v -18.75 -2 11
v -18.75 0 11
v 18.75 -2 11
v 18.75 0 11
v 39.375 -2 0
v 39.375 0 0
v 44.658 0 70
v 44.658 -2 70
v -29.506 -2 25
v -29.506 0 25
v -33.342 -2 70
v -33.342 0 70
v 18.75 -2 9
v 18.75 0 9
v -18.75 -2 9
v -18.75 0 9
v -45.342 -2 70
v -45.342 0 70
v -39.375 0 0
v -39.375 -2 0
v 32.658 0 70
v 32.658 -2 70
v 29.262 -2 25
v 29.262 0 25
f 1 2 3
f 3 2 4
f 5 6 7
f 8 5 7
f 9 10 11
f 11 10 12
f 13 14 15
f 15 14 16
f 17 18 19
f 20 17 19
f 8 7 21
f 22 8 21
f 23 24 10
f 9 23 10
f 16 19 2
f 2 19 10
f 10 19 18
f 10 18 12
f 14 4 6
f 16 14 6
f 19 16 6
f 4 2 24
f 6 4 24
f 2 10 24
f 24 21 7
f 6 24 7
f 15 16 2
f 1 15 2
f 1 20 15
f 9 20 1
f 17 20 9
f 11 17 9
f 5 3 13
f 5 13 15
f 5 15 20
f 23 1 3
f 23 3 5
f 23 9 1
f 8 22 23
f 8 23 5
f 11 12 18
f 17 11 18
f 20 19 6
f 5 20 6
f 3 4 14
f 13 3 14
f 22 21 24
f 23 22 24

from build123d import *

# Parameters (mm, degrees)
F1_DEPTH = 2


with BuildPart() as f1:
    # F0 (on Front) → F1 (new body)
    with BuildSketch(Plane.XZ):
        Polygon((-39.375, 0), (0, 0), (39.375, 0), (44.658148, 70), (32.658148, 70), (29.261839, 25), (-29.506019, 25), (-33.341852, 70), (-45.341852, 70), align=None)
        Polygon((18.75, 9), (0, 9), (-18.75, 9), (-18.75, 11), (18.75, 11), align=None, mode=Mode.SUBTRACT)
    extrude(amount=F1_DEPTH)


solid = f1.part
